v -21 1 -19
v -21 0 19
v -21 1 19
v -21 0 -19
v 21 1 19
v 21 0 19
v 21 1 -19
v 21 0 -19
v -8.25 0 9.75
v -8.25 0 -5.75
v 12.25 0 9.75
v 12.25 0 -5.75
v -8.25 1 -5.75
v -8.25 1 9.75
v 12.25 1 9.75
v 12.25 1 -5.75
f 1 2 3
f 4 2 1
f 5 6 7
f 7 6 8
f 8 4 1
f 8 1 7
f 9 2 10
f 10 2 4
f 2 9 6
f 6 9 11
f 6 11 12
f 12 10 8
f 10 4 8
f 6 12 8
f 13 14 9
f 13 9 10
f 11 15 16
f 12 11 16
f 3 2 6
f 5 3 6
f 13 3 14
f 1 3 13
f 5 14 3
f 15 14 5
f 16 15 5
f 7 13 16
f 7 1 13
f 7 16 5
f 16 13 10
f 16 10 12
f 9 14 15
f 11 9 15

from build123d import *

# Parameters (mm, degrees)
SKETCH_1_W         = 42
SKETCH_1_H         = 38
TOP_DEPTH          = 1
DHT22_WINDOW_REACH = 30.337
SKETCH_2_W         = 20.5
SKETCH_2_H         = 15.5


with BuildPart() as part:
    # 스케치1 → Top (new body)
    with BuildSketch(Plane(origin=(0, 0, 0), x_dir=(1, 0, 0), z_dir=(0, 1, 0))):
        Rectangle(SKETCH_1_W, SKETCH_1_H)
    extrude(amount=TOP_DEPTH)

    # 스케치2 → DHT22_window (cut, up to next)
    with BuildSketch(Plane(origin=(0, 1, 0), x_dir=(1, 0, 0), z_dir=(0, 1, 0)), mode=Mode.PRIVATE) as dht22_window_sk1:
        with Locations((2, -2)):
            Rectangle(SKETCH_2_W, SKETCH_2_H)
    dht22_window_tool1 = extrude(dht22_window_sk1.sketch, amount=-DHT22_WINDOW_REACH, mode=Mode.PRIVATE) & part.part
    add(dht22_window_tool1.solids().sort_by_distance((2, 1, 2))[0], mode=Mode.SUBTRACT)


solid = part.part
